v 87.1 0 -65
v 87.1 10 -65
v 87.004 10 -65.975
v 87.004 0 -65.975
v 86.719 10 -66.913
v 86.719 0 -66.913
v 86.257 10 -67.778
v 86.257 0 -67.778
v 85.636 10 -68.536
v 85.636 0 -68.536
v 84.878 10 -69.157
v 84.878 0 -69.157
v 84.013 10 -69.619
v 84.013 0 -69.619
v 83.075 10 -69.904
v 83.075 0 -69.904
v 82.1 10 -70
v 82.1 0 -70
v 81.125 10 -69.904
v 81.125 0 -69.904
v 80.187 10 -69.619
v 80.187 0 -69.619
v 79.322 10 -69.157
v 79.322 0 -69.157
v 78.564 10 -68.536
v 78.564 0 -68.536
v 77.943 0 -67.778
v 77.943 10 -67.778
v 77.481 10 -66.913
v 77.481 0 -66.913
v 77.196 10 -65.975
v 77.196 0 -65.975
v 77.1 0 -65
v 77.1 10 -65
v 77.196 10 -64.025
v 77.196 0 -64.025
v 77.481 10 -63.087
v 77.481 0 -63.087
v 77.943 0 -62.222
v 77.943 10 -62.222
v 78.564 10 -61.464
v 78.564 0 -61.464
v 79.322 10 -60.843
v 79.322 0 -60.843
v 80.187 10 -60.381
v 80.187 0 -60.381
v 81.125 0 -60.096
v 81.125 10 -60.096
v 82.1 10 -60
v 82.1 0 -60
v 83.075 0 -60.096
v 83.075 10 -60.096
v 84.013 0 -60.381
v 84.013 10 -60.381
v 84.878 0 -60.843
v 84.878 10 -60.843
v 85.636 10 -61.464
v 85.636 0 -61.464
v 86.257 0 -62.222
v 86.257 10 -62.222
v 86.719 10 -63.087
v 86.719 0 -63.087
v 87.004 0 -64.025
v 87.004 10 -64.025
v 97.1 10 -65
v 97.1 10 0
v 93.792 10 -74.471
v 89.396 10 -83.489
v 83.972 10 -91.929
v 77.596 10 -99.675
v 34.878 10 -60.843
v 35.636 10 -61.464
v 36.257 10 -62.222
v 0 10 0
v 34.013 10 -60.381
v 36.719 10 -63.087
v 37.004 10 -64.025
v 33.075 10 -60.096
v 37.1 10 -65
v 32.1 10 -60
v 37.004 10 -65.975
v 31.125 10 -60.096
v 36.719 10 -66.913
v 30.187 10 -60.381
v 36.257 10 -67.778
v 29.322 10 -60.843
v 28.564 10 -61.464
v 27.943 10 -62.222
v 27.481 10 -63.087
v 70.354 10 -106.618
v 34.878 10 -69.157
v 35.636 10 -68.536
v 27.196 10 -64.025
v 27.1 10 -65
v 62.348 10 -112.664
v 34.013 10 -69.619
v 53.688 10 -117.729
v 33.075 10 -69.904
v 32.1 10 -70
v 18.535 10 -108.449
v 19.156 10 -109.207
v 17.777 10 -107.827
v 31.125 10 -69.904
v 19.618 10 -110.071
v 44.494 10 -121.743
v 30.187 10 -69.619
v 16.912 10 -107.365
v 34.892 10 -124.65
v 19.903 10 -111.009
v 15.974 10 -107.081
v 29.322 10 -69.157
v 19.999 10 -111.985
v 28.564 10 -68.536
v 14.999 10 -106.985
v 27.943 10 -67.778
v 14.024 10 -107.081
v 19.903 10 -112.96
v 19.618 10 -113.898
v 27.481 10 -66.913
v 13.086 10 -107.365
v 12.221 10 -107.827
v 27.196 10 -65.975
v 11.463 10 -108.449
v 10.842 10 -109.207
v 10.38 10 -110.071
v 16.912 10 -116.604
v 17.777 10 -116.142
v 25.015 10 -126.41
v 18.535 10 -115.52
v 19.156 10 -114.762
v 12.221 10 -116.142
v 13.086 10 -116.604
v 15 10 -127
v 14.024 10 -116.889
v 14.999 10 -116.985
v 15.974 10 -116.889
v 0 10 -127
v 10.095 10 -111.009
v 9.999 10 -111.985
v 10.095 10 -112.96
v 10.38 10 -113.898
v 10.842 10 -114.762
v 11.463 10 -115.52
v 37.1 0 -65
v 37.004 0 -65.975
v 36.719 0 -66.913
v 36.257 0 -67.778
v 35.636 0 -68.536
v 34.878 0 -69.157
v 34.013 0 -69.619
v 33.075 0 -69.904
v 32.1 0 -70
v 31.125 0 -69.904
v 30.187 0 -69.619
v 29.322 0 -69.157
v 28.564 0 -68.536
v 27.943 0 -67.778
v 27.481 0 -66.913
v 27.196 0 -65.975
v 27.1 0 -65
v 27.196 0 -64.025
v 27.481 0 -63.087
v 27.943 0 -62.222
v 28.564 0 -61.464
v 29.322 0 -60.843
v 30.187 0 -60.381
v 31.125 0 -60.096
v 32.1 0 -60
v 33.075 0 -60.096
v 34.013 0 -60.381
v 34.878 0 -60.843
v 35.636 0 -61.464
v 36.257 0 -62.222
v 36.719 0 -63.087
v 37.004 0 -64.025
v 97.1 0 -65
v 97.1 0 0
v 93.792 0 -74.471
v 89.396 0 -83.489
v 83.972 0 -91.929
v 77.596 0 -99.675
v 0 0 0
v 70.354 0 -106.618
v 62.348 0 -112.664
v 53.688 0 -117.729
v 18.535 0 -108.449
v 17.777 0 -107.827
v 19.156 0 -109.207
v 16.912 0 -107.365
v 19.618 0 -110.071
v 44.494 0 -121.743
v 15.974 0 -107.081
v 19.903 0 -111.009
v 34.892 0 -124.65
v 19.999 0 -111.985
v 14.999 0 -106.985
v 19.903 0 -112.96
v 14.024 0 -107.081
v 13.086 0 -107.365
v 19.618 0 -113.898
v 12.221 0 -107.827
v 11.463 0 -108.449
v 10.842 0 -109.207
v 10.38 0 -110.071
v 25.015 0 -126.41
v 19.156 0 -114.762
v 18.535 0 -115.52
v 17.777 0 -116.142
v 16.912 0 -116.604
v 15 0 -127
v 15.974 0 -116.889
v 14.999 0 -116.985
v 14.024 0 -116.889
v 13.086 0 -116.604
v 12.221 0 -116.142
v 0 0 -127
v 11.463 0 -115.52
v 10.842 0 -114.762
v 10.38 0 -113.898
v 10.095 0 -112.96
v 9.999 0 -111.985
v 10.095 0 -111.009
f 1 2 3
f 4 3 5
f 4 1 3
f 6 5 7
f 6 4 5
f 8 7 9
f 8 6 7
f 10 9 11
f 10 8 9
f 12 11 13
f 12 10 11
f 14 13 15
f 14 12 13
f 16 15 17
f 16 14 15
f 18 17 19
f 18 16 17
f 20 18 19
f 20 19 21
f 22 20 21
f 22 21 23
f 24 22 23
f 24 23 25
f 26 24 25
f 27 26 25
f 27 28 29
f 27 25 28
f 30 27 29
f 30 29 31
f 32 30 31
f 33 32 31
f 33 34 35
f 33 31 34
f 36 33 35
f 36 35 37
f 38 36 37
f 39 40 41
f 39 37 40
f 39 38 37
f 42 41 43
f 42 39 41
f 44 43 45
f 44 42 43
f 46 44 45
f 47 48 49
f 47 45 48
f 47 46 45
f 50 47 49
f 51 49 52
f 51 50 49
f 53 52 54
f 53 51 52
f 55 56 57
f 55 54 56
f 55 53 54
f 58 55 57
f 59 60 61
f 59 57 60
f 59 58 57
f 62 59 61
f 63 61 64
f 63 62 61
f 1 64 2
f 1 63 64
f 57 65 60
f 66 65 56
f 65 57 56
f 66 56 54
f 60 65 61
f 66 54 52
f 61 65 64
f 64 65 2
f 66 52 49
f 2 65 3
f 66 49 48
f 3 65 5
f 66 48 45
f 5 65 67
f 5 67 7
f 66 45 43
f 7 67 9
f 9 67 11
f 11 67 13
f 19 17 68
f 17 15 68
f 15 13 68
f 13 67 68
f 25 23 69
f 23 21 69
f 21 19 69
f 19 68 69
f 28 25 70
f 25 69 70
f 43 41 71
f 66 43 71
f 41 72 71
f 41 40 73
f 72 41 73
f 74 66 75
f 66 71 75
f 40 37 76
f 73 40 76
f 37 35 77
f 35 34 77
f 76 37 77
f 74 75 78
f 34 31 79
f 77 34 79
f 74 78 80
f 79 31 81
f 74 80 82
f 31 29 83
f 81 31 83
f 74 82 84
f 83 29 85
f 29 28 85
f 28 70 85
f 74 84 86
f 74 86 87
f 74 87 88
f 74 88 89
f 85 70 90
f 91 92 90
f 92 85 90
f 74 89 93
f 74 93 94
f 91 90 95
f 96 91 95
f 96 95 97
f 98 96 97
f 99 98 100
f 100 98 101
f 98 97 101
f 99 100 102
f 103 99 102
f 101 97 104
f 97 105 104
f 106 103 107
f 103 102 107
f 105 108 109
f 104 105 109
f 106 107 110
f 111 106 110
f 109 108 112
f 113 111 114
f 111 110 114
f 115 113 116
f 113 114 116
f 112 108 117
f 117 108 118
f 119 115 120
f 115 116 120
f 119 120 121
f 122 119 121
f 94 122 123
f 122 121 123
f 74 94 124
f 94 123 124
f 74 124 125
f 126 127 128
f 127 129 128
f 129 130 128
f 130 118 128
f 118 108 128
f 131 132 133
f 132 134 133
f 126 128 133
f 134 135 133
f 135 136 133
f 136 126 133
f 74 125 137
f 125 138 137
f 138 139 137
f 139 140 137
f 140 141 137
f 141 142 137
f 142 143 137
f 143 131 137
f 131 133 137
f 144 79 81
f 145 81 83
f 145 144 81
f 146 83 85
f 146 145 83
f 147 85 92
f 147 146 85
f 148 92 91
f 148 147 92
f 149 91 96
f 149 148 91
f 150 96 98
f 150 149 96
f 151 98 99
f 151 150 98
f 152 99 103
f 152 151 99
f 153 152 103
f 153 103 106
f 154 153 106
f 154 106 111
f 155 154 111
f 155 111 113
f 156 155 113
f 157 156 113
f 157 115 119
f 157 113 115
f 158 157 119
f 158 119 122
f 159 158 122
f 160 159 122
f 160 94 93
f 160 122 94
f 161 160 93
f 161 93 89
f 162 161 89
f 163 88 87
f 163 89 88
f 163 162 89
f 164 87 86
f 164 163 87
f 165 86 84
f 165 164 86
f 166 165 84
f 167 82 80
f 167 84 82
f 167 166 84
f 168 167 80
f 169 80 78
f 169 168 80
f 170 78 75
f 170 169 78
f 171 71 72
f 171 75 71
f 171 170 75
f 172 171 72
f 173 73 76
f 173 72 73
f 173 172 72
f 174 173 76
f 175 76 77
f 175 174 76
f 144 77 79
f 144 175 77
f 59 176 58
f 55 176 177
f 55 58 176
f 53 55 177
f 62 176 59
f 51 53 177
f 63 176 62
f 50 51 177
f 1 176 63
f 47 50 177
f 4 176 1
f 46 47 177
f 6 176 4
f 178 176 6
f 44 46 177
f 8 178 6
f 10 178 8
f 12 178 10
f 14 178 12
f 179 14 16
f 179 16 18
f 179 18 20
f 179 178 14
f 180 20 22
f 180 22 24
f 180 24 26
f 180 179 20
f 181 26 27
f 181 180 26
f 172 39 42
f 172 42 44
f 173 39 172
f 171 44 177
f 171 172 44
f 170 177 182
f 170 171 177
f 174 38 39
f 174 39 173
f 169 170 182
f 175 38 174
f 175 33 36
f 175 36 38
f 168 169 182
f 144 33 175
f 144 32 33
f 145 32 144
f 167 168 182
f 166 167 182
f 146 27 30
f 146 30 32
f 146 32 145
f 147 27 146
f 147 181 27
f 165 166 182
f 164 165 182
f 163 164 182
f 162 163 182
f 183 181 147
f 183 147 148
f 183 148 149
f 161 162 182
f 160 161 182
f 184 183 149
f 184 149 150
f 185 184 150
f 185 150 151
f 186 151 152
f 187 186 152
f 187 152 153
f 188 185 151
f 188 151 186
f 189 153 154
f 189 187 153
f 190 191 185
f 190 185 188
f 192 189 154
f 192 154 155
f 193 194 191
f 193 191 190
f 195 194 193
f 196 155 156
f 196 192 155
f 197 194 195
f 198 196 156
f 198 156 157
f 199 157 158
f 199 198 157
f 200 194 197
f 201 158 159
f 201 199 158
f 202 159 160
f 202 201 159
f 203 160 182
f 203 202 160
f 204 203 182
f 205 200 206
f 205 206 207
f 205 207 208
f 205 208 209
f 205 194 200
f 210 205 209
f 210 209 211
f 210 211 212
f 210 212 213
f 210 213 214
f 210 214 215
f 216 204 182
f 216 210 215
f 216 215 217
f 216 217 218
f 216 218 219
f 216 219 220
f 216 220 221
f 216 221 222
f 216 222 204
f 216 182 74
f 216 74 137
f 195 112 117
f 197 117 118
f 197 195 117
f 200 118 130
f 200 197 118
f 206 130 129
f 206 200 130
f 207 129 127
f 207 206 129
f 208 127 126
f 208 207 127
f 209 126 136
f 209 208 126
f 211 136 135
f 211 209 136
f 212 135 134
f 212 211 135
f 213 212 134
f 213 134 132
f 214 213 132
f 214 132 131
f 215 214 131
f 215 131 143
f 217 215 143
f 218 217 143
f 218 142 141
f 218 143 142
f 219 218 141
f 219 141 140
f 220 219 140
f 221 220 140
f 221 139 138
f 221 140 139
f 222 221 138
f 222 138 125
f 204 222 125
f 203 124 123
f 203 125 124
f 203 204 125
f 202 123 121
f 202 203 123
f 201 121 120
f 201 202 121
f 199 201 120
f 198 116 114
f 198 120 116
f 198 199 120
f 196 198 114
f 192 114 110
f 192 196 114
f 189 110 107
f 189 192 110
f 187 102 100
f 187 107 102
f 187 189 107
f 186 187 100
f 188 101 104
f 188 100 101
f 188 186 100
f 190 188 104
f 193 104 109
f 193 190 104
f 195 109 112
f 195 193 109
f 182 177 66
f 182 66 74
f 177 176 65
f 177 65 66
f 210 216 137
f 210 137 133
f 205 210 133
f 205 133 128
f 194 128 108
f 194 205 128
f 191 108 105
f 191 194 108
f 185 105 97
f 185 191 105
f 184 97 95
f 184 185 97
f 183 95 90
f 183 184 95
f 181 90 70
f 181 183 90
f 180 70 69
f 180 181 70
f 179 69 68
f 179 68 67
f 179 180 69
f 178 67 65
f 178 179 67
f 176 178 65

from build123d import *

# Parameters (mm, degrees)
BOSS_EXTRUDE1_DEPTH     = 10
SKETCH2_R               = 5
CUT_EXTRUDE4_DEPTH      = 11
CUT_EXTRUDE4_DEPTH_BACK = 1


with BuildPart() as part:
    # Sketch1 → Boss-Extrude1 (new body)
    with BuildSketch(Plane(origin=(0, 0, 0), x_dir=(1, 0, 0), z_dir=(0, 1, 0))):
        with BuildLine():
            Line((0, 0), (0, 127))
            Line((0, 127), (15, 127))
            ThreePointArc((15, 127), (66.440280909, 109.758742946), (97.1, 65))
            Line((97.1, 65), (97.1, 0))
            Line((97.1, 0), (0, 0))
        make_face()
    extrude(amount=BOSS_EXTRUDE1_DEPTH)

    # Sketch2 → Cut-Extrude4 (cut, two sides)
    with BuildSketch(Plane(origin=(0, 0, 0), x_dir=(1, 0, 0), z_dir=(0, 1, 0))) as cut_extrude4_sk:
        with Locations((14.998992834, 111.984631039)):
            Circle(SKETCH2_R)
        with Locations((82.1, 65)):
            Circle(SKETCH2_R)
        with Locations((32.1, 65)):
            Circle(SKETCH2_R)
    extrude(amount=CUT_EXTRUDE4_DEPTH, mode=Mode.SUBTRACT)
    extrude(cut_extrude4_sk.sketch, amount=-CUT_EXTRUDE4_DEPTH_BACK, mode=Mode.SUBTRACT)


solid = part.part
